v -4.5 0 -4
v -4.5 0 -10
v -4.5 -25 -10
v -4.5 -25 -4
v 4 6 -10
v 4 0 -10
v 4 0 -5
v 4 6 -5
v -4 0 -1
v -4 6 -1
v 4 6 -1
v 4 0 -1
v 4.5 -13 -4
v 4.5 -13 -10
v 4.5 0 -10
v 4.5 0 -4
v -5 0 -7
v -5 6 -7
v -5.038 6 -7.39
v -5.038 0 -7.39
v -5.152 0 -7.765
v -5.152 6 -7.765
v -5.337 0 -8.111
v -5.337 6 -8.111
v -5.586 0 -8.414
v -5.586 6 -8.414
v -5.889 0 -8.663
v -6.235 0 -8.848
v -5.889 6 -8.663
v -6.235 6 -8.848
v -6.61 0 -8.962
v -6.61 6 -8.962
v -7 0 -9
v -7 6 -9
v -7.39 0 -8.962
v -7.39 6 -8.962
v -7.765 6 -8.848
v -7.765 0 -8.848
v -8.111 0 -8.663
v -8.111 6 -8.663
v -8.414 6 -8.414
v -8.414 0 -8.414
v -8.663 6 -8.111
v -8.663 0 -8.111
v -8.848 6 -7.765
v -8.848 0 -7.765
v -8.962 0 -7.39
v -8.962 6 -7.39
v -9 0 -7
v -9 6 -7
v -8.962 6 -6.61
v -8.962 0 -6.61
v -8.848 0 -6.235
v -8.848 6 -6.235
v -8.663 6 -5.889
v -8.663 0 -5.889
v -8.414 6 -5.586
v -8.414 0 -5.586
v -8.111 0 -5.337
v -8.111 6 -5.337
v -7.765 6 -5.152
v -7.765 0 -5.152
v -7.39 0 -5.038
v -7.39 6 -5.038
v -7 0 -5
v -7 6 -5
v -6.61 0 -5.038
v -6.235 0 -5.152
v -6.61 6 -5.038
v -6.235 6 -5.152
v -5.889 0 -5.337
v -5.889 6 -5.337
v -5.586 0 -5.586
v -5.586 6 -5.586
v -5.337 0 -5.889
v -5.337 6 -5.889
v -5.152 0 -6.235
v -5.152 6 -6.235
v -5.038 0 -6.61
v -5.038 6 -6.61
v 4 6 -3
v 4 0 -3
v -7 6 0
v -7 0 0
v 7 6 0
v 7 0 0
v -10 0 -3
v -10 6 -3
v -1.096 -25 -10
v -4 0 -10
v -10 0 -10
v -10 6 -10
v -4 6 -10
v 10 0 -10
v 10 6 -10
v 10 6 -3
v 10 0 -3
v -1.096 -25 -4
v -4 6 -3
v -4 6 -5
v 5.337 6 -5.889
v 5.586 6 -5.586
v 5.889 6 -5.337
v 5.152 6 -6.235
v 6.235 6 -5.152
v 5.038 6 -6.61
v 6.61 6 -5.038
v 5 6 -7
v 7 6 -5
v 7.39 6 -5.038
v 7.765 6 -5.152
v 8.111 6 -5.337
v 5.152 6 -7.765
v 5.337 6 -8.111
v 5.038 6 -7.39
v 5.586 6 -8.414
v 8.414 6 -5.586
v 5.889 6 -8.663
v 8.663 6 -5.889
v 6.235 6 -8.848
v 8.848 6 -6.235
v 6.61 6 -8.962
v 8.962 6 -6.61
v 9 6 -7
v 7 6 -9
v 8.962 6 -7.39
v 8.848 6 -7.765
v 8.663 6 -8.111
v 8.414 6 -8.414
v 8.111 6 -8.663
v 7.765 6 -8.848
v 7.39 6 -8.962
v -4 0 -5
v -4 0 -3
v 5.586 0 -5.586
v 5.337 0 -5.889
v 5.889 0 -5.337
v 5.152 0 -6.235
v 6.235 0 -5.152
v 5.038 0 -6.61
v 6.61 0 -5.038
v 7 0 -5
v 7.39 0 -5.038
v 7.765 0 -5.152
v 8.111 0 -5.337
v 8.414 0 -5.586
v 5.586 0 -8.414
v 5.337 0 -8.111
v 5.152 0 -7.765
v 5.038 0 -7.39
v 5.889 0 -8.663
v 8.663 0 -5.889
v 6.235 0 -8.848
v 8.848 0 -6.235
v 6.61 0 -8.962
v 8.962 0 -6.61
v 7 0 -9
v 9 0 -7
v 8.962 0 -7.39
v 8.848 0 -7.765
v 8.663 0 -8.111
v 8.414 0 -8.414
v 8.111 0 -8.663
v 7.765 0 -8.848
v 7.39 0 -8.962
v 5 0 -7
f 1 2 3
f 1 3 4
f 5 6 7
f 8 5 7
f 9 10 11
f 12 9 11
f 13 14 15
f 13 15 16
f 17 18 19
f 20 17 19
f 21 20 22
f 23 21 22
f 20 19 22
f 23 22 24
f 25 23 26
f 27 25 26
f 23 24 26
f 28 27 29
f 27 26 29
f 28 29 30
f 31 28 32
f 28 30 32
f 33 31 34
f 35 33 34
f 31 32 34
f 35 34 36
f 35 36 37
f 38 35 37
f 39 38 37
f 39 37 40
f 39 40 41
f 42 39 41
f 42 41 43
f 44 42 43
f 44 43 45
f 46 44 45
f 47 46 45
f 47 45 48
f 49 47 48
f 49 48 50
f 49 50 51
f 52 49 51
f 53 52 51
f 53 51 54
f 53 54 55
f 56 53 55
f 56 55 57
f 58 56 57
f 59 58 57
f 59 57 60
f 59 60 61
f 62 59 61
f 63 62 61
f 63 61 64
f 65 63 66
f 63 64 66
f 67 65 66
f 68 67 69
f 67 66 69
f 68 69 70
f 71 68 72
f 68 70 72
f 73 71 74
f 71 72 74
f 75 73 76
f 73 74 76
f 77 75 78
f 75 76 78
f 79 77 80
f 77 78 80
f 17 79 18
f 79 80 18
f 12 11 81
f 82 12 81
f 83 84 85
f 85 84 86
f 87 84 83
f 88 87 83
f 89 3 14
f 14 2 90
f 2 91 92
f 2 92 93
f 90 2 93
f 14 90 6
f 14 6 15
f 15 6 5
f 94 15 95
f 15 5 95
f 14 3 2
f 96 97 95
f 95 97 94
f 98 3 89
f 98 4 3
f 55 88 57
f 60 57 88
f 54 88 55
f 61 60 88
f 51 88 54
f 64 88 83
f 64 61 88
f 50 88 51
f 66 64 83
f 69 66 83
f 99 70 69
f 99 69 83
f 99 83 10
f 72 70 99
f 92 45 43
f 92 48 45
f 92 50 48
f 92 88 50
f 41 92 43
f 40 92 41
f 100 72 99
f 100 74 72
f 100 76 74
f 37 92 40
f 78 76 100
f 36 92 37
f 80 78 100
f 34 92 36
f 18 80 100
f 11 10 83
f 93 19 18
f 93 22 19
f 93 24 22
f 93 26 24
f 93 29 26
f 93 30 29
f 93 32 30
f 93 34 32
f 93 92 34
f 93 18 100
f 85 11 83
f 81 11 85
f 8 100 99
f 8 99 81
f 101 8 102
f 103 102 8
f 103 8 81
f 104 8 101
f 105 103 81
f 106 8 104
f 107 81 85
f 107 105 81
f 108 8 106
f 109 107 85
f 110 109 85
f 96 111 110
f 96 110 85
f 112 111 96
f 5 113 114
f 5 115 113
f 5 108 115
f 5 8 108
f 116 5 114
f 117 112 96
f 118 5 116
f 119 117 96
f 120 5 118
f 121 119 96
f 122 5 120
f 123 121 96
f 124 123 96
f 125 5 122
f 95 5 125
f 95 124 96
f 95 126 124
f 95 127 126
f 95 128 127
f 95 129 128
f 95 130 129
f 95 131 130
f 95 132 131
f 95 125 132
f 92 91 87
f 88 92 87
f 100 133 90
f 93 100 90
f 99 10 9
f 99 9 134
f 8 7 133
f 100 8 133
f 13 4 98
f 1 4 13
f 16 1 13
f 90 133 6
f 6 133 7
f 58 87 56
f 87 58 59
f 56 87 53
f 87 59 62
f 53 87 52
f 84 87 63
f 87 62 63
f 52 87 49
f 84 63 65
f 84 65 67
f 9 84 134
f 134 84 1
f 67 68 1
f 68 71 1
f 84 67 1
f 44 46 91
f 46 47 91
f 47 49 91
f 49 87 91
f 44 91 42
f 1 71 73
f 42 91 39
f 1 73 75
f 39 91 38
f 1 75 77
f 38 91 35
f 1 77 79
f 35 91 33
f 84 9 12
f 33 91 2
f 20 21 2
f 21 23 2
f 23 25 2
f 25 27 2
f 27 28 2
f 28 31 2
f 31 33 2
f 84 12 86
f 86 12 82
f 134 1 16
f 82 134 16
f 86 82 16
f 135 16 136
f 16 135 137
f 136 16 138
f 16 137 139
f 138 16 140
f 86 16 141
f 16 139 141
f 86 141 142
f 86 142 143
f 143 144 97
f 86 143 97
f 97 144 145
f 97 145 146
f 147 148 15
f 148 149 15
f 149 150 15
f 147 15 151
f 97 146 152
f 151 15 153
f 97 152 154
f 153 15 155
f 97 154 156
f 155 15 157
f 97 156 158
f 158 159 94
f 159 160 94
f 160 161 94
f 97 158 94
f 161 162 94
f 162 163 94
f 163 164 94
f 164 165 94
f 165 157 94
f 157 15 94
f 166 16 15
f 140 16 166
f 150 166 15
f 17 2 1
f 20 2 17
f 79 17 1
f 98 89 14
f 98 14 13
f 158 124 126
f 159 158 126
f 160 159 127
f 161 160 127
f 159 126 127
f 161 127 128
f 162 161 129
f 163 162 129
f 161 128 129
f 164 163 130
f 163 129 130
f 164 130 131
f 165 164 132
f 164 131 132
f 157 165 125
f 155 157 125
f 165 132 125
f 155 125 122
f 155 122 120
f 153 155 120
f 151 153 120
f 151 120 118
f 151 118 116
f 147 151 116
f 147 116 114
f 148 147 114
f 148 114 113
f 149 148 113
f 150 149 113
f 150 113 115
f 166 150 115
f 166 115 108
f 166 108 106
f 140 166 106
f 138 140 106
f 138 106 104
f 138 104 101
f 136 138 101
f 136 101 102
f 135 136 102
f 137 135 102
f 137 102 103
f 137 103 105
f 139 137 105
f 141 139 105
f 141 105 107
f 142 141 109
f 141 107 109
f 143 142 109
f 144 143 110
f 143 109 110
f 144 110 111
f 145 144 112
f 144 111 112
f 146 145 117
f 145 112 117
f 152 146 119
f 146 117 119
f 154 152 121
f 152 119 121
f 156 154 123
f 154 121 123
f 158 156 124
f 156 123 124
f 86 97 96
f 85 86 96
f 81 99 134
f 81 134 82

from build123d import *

# Parameters (mm, degrees)
EXTRUDE_1_DEPTH     = 6
CUT_EXTRUDE_3_REACH = 8
SKETCH_2_R          = 2
SKETCH_2_W          = 8
SKETCH_2_H          = 2
CHAMFER_1_SIZE      = 3
SKETCH_5_W          = 9
SKETCH_5_H          = 6
EXTRUDE_5_DEPTH     = 25
CHAMFER_3_SIZE      = 12
CHAMFER_3_SIZE2     = 5.595691898


with BuildPart() as part:
    # 草图1 → 凸台-拉伸1 (new body)
    with BuildSketch(Plane(origin=(0, 0, 0), x_dir=(1, 0, 0), z_dir=(0, 1, 0))):
        Polygon((-4, 5), (-4, 10), (-10, 10), (-10, 5), (-10, 0), (10, 0), (10, 5), (10, 10), (4, 10), (4, 5), align=None)
    extrude(amount=EXTRUDE_1_DEPTH)

    # 草图2 → 切除-拉伸3 (cut, up to next)
    with BuildSketch(Plane(origin=(0, 6, 0), x_dir=(1, 0, 0), z_dir=(0, 1, 0)), mode=Mode.PRIVATE) as cut_extrude_3_sk1:
        with Locations((-7, 7)):
            Circle(SKETCH_2_R)
    cut_extrude_3_tool1 = extrude(cut_extrude_3_sk1.sketch, amount=-CUT_EXTRUDE_3_REACH, mode=Mode.PRIVATE) & part.part
    add(cut_extrude_3_tool1.solids().sort_by_distance((-7, 6, -7))[0], mode=Mode.SUBTRACT)
    # 草图2 → 切除-拉伸3 (cut, up to next)
    with BuildSketch(Plane(origin=(0, 6, 0), x_dir=(1, 0, 0), z_dir=(0, 1, 0)), mode=Mode.PRIVATE) as cut_extrude_3_sk2:
        with Locations((7, 7)):
            Circle(SKETCH_2_R)
    cut_extrude_3_tool2 = extrude(cut_extrude_3_sk2.sketch, amount=-CUT_EXTRUDE_3_REACH, mode=Mode.PRIVATE) & part.part
    add(cut_extrude_3_tool2.solids().sort_by_distance((7, 6, -7))[0], mode=Mode.SUBTRACT)
    # 草图2 → 切除-拉伸3 (cut, up to next)
    with BuildSketch(Plane(origin=(0, 6, 0), x_dir=(1, 0, 0), z_dir=(0, 1, 0)), mode=Mode.PRIVATE) as cut_extrude_3_sk3:
        with Locations((0, 2)):
            Rectangle(SKETCH_2_W, SKETCH_2_H)
    cut_extrude_3_tool3 = extrude(cut_extrude_3_sk3.sketch, amount=-CUT_EXTRUDE_3_REACH, mode=Mode.PRIVATE) & part.part
    add(cut_extrude_3_tool3.solids().sort_by_distance((0, 6, -2))[0], mode=Mode.SUBTRACT)

    # 倒角1
    chamfer_1_edges = [part.edges().sort_by_distance(p)[0] for p in [
        (10, 3, 0),
        (-10, 3, 0),
    ]]
    chamfer(chamfer_1_edges, length=CHAMFER_1_SIZE)

    # 草图5 → 凸台-拉伸5 (add)
    with BuildSketch(Plane.XZ):
        with Locations((0, -7)):
            Rectangle(SKETCH_5_W, SKETCH_5_H)
    extrude(amount=EXTRUDE_5_DEPTH)

    # 倒角3
    chamfer_3_edges = [part.edges().sort_by_distance(p)[0] for p in [
        (4.5, -25, -7),
    ]]
    chamfer_3_side = [part.faces().sort_by_distance(p)[0] for p in [
        (4.5, -12.5, -7),
    ]]
    chamfer(chamfer_3_edges, length=CHAMFER_3_SIZE, length2=CHAMFER_3_SIZE2, reference=chamfer_3_side[0])


solid = part.part
